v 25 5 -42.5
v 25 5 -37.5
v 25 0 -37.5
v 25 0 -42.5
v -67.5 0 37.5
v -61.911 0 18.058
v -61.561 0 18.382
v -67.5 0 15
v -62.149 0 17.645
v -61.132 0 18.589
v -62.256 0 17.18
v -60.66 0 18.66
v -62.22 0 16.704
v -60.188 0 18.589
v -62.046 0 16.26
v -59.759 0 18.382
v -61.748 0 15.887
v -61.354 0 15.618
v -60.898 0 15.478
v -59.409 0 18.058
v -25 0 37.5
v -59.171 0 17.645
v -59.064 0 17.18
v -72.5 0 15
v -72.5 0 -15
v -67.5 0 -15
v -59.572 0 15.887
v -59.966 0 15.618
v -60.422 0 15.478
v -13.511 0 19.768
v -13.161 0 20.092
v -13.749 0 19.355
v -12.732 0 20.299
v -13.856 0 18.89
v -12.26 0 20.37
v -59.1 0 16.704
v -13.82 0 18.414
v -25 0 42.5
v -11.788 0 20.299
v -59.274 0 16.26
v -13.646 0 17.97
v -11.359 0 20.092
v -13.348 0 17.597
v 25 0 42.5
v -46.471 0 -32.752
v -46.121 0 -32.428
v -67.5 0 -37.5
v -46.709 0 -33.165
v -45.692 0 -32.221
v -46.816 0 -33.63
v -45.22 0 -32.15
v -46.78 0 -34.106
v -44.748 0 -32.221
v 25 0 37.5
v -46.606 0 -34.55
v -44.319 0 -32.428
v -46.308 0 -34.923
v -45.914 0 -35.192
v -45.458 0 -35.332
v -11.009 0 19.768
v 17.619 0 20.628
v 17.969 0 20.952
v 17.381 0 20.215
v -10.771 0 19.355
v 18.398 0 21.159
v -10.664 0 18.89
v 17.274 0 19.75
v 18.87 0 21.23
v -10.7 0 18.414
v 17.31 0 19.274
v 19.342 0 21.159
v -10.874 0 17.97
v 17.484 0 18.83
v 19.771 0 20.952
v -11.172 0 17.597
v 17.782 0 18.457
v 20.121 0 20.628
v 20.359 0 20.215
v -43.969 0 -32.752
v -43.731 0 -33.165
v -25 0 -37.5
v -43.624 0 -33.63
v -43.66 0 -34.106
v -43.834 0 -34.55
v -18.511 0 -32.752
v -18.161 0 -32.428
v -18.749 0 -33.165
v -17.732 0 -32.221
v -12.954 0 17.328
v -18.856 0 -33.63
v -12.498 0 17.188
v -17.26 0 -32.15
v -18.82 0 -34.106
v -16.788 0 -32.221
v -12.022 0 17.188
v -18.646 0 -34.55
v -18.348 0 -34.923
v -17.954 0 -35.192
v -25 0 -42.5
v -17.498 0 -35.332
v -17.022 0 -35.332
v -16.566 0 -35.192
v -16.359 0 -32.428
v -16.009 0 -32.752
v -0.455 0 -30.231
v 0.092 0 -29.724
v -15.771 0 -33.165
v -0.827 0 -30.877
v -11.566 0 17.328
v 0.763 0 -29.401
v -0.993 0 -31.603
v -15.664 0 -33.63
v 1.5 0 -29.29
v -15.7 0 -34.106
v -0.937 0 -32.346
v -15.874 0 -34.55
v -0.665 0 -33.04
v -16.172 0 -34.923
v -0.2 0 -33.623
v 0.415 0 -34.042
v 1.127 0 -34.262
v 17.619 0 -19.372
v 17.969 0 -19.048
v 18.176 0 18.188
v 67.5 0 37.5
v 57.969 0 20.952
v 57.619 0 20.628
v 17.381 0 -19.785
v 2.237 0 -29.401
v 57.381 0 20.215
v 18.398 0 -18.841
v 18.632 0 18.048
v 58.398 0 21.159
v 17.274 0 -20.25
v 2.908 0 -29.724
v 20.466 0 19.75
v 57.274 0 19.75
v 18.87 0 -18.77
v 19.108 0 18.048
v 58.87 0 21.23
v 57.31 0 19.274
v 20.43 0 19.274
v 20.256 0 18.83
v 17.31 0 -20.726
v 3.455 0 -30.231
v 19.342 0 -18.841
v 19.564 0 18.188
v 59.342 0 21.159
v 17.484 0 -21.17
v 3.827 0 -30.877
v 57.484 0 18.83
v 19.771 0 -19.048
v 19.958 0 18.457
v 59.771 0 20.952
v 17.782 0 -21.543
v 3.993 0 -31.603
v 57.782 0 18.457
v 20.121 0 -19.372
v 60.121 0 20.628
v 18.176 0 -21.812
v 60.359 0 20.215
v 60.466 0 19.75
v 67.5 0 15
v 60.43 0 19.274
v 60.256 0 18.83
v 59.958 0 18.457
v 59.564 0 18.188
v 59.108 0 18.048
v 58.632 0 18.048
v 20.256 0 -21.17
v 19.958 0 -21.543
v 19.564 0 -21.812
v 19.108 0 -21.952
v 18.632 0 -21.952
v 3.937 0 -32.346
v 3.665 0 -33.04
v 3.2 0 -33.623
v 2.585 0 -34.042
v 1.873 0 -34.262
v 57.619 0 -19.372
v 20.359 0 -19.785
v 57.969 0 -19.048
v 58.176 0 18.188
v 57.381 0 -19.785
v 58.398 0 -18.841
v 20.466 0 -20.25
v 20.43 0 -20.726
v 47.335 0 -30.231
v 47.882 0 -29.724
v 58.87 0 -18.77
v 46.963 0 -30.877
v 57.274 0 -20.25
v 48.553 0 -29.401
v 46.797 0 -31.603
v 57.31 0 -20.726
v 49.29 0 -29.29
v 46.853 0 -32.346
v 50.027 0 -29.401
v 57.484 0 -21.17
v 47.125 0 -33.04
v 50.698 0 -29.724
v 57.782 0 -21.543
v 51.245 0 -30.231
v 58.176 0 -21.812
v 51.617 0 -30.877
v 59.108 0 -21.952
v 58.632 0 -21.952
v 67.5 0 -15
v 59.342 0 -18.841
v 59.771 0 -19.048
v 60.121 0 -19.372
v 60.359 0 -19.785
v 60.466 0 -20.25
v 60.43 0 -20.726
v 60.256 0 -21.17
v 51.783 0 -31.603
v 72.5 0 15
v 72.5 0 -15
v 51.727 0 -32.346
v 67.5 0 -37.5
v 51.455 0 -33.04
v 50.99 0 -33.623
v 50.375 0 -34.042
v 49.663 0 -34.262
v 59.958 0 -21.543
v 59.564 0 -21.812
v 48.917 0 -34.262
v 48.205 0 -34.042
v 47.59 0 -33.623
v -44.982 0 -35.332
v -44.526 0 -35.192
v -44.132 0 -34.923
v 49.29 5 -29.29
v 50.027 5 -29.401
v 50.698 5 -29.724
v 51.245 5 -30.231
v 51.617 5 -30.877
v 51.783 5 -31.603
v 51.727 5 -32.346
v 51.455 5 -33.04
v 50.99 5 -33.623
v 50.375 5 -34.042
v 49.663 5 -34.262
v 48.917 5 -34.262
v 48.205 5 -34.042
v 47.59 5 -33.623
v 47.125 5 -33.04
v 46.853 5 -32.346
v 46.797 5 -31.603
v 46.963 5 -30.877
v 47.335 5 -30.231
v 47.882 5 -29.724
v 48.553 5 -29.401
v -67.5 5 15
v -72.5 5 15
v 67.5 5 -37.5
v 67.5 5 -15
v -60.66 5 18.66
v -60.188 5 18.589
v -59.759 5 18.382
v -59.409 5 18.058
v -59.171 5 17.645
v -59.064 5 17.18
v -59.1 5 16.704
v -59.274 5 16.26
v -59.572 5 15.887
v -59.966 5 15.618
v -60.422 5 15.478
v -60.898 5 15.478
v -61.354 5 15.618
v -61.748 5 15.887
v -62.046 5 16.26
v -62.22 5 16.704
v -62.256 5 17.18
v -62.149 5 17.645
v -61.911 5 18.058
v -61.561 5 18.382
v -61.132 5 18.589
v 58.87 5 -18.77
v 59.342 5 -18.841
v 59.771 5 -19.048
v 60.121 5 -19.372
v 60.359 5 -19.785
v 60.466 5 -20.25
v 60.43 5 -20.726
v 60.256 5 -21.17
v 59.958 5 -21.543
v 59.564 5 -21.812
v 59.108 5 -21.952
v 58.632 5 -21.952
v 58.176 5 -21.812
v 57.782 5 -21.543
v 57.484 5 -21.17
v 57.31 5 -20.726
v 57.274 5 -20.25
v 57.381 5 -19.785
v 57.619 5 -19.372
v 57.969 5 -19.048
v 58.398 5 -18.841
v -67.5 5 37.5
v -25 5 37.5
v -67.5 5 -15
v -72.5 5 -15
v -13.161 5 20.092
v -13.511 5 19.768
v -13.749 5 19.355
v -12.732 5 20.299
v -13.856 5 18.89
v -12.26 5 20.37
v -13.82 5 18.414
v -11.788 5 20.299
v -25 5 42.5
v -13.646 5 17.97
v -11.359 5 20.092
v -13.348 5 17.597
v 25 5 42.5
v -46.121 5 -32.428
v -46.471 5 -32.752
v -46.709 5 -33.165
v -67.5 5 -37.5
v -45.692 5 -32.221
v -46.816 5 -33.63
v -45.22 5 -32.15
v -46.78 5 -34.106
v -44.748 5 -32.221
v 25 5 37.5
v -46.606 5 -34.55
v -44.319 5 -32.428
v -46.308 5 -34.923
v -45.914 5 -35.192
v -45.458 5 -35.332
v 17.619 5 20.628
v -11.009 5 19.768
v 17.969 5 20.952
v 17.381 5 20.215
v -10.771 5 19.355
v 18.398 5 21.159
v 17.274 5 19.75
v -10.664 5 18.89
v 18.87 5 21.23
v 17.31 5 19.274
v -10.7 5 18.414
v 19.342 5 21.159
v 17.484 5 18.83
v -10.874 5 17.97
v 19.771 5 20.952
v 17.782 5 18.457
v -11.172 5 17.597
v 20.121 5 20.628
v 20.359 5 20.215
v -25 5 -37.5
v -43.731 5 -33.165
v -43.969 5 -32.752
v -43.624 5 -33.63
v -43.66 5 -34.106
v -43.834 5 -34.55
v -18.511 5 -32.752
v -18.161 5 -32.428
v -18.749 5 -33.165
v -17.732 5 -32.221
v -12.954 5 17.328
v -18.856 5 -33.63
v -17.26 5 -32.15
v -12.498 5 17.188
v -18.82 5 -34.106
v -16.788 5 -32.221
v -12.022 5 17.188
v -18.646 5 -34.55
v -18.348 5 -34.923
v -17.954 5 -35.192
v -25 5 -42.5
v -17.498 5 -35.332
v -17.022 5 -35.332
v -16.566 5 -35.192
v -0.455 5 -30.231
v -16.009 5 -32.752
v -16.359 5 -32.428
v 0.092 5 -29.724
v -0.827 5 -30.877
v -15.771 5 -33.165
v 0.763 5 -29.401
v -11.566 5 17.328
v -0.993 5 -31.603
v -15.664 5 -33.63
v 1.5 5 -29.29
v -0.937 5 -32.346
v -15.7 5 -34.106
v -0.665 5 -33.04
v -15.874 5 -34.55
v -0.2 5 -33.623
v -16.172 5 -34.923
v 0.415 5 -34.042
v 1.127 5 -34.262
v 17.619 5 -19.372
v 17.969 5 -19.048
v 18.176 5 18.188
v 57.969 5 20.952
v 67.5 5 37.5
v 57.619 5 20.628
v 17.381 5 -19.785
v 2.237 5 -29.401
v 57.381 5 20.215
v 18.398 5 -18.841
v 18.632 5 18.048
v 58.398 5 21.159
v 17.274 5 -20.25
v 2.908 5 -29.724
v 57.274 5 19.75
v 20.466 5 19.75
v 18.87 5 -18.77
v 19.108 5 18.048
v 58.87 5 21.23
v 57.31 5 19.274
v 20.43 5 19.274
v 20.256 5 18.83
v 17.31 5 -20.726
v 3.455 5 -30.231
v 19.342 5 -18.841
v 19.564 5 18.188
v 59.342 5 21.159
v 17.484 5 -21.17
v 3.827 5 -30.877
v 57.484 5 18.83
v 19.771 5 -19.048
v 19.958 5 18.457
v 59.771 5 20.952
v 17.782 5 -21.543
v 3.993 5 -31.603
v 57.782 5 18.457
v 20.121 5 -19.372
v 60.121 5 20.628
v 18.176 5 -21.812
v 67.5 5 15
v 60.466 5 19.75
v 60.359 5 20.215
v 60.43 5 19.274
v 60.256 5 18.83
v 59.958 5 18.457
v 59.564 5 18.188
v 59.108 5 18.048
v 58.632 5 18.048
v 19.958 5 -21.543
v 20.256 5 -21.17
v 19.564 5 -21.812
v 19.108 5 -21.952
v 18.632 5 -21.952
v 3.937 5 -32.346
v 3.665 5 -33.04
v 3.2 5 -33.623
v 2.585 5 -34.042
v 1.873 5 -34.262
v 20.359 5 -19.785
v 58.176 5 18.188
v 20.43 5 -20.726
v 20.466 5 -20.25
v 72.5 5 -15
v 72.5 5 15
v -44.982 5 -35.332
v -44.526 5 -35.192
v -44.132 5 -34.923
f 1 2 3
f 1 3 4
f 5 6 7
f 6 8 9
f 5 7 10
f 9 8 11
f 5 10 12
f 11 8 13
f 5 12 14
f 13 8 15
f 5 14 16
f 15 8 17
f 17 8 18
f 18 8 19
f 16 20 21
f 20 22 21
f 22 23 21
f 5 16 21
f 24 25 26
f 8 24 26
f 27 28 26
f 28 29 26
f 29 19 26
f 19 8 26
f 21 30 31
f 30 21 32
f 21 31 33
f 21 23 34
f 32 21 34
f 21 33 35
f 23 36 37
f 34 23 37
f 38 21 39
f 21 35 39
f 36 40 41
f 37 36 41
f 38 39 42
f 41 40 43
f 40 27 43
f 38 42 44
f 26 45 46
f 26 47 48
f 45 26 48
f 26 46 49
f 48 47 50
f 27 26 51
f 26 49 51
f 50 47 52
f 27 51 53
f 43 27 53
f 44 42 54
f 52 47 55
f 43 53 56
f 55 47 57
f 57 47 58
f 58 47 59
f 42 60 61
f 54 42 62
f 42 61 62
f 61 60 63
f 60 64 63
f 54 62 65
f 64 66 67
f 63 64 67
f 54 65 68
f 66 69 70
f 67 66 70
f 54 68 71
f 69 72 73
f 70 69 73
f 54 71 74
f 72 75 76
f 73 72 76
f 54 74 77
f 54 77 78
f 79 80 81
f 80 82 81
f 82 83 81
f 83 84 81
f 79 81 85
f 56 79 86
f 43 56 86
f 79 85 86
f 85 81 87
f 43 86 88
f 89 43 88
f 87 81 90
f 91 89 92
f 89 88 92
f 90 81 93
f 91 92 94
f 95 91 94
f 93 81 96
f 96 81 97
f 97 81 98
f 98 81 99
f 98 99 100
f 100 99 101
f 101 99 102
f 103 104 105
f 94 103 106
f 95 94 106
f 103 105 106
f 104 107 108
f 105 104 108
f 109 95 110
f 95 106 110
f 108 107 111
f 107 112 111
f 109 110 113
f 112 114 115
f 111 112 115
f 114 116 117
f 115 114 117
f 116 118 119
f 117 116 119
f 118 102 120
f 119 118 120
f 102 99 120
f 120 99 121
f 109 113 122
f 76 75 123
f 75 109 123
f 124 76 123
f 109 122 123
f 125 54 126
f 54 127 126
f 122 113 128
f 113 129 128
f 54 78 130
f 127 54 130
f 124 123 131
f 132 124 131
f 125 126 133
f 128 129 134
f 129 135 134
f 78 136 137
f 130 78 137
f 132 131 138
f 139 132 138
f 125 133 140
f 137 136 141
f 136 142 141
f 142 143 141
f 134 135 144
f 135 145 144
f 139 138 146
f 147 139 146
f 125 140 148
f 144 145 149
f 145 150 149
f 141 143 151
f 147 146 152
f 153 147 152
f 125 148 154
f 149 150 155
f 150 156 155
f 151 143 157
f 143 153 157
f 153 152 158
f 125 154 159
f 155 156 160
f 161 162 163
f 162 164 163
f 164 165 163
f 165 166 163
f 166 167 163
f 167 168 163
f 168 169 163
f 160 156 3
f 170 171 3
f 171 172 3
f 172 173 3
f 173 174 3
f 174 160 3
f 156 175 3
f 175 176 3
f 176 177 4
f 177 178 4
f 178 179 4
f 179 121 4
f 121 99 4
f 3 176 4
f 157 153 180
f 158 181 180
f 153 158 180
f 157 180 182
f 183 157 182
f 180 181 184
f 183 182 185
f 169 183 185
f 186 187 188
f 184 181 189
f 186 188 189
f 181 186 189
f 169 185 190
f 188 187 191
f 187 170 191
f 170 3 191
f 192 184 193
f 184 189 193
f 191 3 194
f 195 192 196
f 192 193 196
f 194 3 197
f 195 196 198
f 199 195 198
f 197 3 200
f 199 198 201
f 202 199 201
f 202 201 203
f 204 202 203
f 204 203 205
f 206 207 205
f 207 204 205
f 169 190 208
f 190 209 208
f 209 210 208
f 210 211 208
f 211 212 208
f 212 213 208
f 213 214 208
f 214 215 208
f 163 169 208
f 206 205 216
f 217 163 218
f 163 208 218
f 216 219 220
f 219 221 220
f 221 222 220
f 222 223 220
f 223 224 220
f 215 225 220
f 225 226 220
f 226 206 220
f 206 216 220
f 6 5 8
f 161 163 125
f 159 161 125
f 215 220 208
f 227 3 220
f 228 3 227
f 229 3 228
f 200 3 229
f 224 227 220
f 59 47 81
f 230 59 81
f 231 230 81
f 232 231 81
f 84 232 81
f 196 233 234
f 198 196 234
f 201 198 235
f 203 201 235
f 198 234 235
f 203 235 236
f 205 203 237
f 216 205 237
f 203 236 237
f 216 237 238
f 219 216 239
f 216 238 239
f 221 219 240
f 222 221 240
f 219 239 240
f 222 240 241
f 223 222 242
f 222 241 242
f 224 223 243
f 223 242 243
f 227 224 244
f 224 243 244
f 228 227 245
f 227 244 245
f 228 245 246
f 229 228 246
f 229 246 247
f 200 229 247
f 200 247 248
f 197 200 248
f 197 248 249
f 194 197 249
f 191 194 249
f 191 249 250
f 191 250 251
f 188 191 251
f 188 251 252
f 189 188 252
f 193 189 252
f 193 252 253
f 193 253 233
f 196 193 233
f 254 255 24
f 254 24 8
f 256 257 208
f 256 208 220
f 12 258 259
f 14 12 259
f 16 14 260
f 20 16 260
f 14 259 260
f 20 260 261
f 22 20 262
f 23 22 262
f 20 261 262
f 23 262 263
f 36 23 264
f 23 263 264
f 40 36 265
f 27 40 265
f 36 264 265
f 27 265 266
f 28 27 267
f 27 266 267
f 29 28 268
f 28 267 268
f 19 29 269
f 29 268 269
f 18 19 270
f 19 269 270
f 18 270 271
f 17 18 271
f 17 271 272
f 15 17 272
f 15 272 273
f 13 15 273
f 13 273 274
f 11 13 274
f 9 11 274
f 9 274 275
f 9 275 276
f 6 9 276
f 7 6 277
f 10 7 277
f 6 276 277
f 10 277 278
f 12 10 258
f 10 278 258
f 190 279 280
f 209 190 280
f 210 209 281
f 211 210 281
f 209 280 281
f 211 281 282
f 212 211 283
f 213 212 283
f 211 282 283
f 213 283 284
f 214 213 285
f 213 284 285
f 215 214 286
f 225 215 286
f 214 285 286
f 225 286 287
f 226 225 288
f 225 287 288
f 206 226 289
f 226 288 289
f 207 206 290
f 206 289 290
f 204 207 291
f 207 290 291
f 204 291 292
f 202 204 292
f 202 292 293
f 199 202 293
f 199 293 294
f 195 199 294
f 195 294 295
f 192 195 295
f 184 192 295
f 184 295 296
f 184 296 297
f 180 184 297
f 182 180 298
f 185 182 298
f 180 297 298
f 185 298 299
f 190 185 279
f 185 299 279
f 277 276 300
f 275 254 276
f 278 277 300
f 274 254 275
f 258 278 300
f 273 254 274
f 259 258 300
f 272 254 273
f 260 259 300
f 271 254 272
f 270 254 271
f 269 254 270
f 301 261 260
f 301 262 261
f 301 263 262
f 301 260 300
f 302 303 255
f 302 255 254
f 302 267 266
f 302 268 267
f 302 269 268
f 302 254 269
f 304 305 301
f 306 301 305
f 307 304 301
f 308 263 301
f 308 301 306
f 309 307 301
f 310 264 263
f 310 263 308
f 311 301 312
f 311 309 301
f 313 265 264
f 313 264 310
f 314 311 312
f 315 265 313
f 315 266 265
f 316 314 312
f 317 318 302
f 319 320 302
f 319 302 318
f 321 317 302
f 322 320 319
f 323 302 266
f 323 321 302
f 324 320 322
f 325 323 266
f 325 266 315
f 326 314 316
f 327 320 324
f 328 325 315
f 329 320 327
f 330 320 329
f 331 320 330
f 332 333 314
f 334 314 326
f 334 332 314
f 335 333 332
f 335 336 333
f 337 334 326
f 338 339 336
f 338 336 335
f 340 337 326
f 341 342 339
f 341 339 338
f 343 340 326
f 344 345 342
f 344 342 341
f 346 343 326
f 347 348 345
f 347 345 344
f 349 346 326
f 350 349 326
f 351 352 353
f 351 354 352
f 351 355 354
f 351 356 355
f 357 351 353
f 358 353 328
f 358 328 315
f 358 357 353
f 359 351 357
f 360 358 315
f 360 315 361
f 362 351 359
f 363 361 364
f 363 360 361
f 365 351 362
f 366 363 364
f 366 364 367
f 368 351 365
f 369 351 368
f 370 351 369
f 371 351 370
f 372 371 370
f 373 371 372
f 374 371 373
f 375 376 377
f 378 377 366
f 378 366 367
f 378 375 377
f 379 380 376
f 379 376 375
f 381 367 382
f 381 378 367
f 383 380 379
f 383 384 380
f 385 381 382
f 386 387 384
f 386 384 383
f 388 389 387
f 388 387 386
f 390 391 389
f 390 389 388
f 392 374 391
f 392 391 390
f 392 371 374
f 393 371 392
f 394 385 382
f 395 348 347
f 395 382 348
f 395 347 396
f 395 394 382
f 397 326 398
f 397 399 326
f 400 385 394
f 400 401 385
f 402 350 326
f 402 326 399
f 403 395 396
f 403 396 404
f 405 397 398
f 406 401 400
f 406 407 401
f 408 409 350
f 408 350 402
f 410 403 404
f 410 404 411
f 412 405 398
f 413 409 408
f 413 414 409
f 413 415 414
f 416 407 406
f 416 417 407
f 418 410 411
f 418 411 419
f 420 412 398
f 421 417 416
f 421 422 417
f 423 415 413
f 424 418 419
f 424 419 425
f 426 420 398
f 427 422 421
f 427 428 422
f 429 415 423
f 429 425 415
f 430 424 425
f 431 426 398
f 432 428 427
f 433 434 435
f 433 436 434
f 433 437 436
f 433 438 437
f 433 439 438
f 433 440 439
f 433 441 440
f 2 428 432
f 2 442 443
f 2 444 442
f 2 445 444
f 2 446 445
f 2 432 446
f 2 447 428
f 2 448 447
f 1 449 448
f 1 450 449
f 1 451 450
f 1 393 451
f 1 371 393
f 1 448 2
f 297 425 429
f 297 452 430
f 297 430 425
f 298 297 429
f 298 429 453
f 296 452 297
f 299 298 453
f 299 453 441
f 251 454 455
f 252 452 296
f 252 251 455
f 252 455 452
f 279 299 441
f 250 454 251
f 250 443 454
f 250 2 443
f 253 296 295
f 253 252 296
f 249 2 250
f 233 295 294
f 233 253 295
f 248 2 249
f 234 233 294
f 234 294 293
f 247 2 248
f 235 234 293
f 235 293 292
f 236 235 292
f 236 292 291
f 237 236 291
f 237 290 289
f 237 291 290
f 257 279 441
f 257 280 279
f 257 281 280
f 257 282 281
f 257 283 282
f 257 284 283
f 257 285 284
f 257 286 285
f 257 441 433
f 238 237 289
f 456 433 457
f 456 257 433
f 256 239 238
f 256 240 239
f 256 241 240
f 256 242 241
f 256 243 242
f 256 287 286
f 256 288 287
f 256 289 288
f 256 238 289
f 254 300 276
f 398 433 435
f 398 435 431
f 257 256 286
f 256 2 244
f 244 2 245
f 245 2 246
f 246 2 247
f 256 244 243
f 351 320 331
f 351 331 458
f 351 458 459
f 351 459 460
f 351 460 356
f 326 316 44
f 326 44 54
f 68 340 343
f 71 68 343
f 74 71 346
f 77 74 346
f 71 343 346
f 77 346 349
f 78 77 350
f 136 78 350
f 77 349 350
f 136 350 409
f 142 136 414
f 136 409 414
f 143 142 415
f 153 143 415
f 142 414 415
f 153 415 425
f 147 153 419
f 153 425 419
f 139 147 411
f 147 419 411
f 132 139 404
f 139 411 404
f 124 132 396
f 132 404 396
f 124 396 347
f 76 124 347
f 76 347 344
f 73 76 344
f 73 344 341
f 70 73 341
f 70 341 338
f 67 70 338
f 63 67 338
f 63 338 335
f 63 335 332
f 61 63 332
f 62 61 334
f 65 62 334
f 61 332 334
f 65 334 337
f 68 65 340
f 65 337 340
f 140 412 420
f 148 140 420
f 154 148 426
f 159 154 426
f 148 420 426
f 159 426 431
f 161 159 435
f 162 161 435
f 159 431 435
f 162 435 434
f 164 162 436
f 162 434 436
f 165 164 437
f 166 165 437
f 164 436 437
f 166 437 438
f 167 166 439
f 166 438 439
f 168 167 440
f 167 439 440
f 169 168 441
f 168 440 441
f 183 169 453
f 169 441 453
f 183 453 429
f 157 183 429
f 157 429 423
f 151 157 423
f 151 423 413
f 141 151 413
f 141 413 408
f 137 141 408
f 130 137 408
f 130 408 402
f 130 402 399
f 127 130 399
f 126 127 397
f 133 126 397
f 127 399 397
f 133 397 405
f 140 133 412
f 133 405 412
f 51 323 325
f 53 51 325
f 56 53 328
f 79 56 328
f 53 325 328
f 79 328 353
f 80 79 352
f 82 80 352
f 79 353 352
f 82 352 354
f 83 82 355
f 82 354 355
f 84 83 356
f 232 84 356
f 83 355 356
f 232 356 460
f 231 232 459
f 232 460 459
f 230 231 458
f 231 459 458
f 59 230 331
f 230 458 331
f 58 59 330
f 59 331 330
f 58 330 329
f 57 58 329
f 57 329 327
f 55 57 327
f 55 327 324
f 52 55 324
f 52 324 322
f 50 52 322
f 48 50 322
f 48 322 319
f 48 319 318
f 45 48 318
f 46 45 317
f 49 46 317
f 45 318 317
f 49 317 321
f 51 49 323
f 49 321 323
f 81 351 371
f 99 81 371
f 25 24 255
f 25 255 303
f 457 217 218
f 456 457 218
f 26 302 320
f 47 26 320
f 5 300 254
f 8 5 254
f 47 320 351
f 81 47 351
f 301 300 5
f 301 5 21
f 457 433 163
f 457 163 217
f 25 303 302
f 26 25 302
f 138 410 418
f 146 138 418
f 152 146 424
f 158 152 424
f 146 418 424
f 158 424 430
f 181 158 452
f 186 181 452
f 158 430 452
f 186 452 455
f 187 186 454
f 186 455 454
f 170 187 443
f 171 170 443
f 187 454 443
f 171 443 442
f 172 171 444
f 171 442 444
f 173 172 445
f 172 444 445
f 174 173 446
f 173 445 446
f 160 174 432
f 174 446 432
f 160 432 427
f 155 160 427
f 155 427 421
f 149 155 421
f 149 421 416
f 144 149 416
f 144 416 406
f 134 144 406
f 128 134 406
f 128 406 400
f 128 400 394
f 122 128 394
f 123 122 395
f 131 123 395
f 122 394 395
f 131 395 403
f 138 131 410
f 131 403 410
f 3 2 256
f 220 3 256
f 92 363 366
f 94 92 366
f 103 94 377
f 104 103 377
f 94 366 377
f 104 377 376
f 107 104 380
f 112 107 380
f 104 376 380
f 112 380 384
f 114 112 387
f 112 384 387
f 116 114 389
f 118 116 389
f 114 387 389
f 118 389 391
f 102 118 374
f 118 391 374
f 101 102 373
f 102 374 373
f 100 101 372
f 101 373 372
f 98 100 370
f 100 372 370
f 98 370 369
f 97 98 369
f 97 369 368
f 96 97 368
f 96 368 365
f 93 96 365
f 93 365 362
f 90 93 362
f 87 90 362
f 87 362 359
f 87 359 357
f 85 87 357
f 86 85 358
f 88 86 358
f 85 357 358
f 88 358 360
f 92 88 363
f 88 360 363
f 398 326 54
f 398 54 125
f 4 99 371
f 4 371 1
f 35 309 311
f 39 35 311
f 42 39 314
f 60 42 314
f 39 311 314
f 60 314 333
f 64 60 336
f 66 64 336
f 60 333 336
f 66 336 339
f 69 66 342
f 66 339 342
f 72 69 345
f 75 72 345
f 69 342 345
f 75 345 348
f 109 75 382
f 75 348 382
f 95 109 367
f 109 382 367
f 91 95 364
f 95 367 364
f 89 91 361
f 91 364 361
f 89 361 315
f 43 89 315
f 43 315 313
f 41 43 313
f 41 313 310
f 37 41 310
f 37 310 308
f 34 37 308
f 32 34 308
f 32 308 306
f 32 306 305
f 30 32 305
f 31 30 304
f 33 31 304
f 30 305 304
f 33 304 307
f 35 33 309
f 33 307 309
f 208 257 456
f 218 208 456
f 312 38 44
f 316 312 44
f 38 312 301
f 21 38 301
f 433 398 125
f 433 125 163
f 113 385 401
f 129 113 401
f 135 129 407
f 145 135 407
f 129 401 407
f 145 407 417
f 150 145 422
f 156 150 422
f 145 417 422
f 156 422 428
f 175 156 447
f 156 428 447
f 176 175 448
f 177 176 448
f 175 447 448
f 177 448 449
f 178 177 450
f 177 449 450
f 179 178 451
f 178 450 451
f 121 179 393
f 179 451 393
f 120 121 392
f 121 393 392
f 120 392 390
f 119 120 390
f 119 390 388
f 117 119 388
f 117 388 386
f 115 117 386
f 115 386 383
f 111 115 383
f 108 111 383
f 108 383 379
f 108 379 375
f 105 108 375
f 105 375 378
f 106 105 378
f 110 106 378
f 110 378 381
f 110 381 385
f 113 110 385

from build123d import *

# Parameters (mm, degrees)
SKETCH1_W           = 145
SKETCH1_H           = 85
BOSS_EXTRUDE1_DEPTH = 5
SKETCH2_W           = 47.5
SKETCH2_H           = 5
CUT_EXTRUDE1_DEPTH  = 5
SKETCH3_W           = 5
SKETCH3_H           = 22.5
CUT_EXTRUDE2_DEPTH  = 5
SKETCH4_R           = 1.6
CUT_EXTRUDE3_DEPTH  = 5
SKETCH5_R           = 1.6
CUT_EXTRUDE4_DEPTH  = 5
SKETCH6_R           = 2.5
CUT_EXTRUDE5_DEPTH  = 10


with BuildPart() as part:
    # Sketch1 → Boss-Extrude1 (new body)
    with BuildSketch(Plane(origin=(0, 0, 0), x_dir=(1, 0, 0), z_dir=(0, 1, 0))):
        Rectangle(SKETCH1_W, SKETCH1_H)
    extrude(amount=BOSS_EXTRUDE1_DEPTH)

    # Sketch2 → Cut-Extrude1 (cut)
    with BuildSketch(Plane(origin=(0, 5, 0), x_dir=(1, 0, 0), z_dir=(0, 1, 0))):
        with Locations((-48.75, 40)):
            Rectangle(SKETCH2_W, SKETCH2_H)
        with Locations((48.75, 40)):
            Rectangle(SKETCH2_W, SKETCH2_H)
        with Locations((48.75, -40)):
            Rectangle(SKETCH2_W, SKETCH2_H)
        with Locations((-48.75, -40)):
            Rectangle(SKETCH2_W, SKETCH2_H)
    extrude(amount=-CUT_EXTRUDE1_DEPTH, mode=Mode.SUBTRACT)

    # Sketch3 → Cut-Extrude2 (cut)
    with BuildSketch(Plane(origin=(0, 5, 0), x_dir=(1, 0, 0), z_dir=(0, 1, 0))):
        with Locations((-70, 26.25)):
            Rectangle(SKETCH3_W, SKETCH3_H)
        with Locations((-70, -26.25)):
            Rectangle(SKETCH3_W, SKETCH3_H)
        with Locations((70, -26.25)):
            Rectangle(SKETCH3_W, SKETCH3_H)
        with Locations((70, 26.25)):
            Rectangle(SKETCH3_W, SKETCH3_H)
    extrude(amount=-CUT_EXTRUDE2_DEPTH, mode=Mode.SUBTRACT)

    # Sketch4 → Cut-Extrude3 (cut)
    with BuildSketch(Plane(origin=(0, 5, 0), x_dir=(1, 0, 0), z_dir=(0, 1, 0))):
        with Locations(Location((-12.26, -18.77, 0), (0, 0, 270))):
            Circle(SKETCH4_R)
        with Locations(Location((-60.66, -17.06, 0), (0, 0, 270))):
            Circle(SKETCH4_R)
        with Locations(Location((-45.22, 33.75, 0), (0, 0, 270))):
            Circle(SKETCH4_R)
        with Locations(Location((-17.26, 33.75, 0), (0, 0, 270))):
            Circle(SKETCH4_R)
    extrude(amount=-CUT_EXTRUDE3_DEPTH, mode=Mode.SUBTRACT)

    # Sketch5 → Cut-Extrude4 (cut)
    with BuildSketch(Plane(origin=(0, 5, 0), x_dir=(1, 0, 0), z_dir=(0, 1, 0))):
        with Locations(Location((58.87, 20.37, 0), (0, 0, 270))):
            Circle(SKETCH5_R)
        with Locations(Location((18.87, 20.37, 0), (0, 0, 270))):
            Circle(SKETCH5_R)
        with Locations(Location((18.87, -19.63, 0), (0, 0, 270))):
            Circle(SKETCH5_R)
        with Locations(Location((58.87, -19.63, 0), (0, 0, 270))):
            Circle(SKETCH5_R)
    extrude(amount=-CUT_EXTRUDE4_DEPTH, mode=Mode.SUBTRACT)

    # Sketch6 → Cut-Extrude5 (cut)
    with BuildSketch(Plane(origin=(0, 5, 0), x_dir=(1, 0, 0), z_dir=(0, 1, 0))):
        with Locations(Location((49.29, 31.79, 0), (0, 0, 270))):
            Circle(SKETCH6_R)
        with Locations(Location((1.5, 31.79, 0), (0, 0, 270))):
            Circle(SKETCH6_R)
    extrude(amount=-CUT_EXTRUDE5_DEPTH, mode=Mode.SUBTRACT)


solid = part.part
